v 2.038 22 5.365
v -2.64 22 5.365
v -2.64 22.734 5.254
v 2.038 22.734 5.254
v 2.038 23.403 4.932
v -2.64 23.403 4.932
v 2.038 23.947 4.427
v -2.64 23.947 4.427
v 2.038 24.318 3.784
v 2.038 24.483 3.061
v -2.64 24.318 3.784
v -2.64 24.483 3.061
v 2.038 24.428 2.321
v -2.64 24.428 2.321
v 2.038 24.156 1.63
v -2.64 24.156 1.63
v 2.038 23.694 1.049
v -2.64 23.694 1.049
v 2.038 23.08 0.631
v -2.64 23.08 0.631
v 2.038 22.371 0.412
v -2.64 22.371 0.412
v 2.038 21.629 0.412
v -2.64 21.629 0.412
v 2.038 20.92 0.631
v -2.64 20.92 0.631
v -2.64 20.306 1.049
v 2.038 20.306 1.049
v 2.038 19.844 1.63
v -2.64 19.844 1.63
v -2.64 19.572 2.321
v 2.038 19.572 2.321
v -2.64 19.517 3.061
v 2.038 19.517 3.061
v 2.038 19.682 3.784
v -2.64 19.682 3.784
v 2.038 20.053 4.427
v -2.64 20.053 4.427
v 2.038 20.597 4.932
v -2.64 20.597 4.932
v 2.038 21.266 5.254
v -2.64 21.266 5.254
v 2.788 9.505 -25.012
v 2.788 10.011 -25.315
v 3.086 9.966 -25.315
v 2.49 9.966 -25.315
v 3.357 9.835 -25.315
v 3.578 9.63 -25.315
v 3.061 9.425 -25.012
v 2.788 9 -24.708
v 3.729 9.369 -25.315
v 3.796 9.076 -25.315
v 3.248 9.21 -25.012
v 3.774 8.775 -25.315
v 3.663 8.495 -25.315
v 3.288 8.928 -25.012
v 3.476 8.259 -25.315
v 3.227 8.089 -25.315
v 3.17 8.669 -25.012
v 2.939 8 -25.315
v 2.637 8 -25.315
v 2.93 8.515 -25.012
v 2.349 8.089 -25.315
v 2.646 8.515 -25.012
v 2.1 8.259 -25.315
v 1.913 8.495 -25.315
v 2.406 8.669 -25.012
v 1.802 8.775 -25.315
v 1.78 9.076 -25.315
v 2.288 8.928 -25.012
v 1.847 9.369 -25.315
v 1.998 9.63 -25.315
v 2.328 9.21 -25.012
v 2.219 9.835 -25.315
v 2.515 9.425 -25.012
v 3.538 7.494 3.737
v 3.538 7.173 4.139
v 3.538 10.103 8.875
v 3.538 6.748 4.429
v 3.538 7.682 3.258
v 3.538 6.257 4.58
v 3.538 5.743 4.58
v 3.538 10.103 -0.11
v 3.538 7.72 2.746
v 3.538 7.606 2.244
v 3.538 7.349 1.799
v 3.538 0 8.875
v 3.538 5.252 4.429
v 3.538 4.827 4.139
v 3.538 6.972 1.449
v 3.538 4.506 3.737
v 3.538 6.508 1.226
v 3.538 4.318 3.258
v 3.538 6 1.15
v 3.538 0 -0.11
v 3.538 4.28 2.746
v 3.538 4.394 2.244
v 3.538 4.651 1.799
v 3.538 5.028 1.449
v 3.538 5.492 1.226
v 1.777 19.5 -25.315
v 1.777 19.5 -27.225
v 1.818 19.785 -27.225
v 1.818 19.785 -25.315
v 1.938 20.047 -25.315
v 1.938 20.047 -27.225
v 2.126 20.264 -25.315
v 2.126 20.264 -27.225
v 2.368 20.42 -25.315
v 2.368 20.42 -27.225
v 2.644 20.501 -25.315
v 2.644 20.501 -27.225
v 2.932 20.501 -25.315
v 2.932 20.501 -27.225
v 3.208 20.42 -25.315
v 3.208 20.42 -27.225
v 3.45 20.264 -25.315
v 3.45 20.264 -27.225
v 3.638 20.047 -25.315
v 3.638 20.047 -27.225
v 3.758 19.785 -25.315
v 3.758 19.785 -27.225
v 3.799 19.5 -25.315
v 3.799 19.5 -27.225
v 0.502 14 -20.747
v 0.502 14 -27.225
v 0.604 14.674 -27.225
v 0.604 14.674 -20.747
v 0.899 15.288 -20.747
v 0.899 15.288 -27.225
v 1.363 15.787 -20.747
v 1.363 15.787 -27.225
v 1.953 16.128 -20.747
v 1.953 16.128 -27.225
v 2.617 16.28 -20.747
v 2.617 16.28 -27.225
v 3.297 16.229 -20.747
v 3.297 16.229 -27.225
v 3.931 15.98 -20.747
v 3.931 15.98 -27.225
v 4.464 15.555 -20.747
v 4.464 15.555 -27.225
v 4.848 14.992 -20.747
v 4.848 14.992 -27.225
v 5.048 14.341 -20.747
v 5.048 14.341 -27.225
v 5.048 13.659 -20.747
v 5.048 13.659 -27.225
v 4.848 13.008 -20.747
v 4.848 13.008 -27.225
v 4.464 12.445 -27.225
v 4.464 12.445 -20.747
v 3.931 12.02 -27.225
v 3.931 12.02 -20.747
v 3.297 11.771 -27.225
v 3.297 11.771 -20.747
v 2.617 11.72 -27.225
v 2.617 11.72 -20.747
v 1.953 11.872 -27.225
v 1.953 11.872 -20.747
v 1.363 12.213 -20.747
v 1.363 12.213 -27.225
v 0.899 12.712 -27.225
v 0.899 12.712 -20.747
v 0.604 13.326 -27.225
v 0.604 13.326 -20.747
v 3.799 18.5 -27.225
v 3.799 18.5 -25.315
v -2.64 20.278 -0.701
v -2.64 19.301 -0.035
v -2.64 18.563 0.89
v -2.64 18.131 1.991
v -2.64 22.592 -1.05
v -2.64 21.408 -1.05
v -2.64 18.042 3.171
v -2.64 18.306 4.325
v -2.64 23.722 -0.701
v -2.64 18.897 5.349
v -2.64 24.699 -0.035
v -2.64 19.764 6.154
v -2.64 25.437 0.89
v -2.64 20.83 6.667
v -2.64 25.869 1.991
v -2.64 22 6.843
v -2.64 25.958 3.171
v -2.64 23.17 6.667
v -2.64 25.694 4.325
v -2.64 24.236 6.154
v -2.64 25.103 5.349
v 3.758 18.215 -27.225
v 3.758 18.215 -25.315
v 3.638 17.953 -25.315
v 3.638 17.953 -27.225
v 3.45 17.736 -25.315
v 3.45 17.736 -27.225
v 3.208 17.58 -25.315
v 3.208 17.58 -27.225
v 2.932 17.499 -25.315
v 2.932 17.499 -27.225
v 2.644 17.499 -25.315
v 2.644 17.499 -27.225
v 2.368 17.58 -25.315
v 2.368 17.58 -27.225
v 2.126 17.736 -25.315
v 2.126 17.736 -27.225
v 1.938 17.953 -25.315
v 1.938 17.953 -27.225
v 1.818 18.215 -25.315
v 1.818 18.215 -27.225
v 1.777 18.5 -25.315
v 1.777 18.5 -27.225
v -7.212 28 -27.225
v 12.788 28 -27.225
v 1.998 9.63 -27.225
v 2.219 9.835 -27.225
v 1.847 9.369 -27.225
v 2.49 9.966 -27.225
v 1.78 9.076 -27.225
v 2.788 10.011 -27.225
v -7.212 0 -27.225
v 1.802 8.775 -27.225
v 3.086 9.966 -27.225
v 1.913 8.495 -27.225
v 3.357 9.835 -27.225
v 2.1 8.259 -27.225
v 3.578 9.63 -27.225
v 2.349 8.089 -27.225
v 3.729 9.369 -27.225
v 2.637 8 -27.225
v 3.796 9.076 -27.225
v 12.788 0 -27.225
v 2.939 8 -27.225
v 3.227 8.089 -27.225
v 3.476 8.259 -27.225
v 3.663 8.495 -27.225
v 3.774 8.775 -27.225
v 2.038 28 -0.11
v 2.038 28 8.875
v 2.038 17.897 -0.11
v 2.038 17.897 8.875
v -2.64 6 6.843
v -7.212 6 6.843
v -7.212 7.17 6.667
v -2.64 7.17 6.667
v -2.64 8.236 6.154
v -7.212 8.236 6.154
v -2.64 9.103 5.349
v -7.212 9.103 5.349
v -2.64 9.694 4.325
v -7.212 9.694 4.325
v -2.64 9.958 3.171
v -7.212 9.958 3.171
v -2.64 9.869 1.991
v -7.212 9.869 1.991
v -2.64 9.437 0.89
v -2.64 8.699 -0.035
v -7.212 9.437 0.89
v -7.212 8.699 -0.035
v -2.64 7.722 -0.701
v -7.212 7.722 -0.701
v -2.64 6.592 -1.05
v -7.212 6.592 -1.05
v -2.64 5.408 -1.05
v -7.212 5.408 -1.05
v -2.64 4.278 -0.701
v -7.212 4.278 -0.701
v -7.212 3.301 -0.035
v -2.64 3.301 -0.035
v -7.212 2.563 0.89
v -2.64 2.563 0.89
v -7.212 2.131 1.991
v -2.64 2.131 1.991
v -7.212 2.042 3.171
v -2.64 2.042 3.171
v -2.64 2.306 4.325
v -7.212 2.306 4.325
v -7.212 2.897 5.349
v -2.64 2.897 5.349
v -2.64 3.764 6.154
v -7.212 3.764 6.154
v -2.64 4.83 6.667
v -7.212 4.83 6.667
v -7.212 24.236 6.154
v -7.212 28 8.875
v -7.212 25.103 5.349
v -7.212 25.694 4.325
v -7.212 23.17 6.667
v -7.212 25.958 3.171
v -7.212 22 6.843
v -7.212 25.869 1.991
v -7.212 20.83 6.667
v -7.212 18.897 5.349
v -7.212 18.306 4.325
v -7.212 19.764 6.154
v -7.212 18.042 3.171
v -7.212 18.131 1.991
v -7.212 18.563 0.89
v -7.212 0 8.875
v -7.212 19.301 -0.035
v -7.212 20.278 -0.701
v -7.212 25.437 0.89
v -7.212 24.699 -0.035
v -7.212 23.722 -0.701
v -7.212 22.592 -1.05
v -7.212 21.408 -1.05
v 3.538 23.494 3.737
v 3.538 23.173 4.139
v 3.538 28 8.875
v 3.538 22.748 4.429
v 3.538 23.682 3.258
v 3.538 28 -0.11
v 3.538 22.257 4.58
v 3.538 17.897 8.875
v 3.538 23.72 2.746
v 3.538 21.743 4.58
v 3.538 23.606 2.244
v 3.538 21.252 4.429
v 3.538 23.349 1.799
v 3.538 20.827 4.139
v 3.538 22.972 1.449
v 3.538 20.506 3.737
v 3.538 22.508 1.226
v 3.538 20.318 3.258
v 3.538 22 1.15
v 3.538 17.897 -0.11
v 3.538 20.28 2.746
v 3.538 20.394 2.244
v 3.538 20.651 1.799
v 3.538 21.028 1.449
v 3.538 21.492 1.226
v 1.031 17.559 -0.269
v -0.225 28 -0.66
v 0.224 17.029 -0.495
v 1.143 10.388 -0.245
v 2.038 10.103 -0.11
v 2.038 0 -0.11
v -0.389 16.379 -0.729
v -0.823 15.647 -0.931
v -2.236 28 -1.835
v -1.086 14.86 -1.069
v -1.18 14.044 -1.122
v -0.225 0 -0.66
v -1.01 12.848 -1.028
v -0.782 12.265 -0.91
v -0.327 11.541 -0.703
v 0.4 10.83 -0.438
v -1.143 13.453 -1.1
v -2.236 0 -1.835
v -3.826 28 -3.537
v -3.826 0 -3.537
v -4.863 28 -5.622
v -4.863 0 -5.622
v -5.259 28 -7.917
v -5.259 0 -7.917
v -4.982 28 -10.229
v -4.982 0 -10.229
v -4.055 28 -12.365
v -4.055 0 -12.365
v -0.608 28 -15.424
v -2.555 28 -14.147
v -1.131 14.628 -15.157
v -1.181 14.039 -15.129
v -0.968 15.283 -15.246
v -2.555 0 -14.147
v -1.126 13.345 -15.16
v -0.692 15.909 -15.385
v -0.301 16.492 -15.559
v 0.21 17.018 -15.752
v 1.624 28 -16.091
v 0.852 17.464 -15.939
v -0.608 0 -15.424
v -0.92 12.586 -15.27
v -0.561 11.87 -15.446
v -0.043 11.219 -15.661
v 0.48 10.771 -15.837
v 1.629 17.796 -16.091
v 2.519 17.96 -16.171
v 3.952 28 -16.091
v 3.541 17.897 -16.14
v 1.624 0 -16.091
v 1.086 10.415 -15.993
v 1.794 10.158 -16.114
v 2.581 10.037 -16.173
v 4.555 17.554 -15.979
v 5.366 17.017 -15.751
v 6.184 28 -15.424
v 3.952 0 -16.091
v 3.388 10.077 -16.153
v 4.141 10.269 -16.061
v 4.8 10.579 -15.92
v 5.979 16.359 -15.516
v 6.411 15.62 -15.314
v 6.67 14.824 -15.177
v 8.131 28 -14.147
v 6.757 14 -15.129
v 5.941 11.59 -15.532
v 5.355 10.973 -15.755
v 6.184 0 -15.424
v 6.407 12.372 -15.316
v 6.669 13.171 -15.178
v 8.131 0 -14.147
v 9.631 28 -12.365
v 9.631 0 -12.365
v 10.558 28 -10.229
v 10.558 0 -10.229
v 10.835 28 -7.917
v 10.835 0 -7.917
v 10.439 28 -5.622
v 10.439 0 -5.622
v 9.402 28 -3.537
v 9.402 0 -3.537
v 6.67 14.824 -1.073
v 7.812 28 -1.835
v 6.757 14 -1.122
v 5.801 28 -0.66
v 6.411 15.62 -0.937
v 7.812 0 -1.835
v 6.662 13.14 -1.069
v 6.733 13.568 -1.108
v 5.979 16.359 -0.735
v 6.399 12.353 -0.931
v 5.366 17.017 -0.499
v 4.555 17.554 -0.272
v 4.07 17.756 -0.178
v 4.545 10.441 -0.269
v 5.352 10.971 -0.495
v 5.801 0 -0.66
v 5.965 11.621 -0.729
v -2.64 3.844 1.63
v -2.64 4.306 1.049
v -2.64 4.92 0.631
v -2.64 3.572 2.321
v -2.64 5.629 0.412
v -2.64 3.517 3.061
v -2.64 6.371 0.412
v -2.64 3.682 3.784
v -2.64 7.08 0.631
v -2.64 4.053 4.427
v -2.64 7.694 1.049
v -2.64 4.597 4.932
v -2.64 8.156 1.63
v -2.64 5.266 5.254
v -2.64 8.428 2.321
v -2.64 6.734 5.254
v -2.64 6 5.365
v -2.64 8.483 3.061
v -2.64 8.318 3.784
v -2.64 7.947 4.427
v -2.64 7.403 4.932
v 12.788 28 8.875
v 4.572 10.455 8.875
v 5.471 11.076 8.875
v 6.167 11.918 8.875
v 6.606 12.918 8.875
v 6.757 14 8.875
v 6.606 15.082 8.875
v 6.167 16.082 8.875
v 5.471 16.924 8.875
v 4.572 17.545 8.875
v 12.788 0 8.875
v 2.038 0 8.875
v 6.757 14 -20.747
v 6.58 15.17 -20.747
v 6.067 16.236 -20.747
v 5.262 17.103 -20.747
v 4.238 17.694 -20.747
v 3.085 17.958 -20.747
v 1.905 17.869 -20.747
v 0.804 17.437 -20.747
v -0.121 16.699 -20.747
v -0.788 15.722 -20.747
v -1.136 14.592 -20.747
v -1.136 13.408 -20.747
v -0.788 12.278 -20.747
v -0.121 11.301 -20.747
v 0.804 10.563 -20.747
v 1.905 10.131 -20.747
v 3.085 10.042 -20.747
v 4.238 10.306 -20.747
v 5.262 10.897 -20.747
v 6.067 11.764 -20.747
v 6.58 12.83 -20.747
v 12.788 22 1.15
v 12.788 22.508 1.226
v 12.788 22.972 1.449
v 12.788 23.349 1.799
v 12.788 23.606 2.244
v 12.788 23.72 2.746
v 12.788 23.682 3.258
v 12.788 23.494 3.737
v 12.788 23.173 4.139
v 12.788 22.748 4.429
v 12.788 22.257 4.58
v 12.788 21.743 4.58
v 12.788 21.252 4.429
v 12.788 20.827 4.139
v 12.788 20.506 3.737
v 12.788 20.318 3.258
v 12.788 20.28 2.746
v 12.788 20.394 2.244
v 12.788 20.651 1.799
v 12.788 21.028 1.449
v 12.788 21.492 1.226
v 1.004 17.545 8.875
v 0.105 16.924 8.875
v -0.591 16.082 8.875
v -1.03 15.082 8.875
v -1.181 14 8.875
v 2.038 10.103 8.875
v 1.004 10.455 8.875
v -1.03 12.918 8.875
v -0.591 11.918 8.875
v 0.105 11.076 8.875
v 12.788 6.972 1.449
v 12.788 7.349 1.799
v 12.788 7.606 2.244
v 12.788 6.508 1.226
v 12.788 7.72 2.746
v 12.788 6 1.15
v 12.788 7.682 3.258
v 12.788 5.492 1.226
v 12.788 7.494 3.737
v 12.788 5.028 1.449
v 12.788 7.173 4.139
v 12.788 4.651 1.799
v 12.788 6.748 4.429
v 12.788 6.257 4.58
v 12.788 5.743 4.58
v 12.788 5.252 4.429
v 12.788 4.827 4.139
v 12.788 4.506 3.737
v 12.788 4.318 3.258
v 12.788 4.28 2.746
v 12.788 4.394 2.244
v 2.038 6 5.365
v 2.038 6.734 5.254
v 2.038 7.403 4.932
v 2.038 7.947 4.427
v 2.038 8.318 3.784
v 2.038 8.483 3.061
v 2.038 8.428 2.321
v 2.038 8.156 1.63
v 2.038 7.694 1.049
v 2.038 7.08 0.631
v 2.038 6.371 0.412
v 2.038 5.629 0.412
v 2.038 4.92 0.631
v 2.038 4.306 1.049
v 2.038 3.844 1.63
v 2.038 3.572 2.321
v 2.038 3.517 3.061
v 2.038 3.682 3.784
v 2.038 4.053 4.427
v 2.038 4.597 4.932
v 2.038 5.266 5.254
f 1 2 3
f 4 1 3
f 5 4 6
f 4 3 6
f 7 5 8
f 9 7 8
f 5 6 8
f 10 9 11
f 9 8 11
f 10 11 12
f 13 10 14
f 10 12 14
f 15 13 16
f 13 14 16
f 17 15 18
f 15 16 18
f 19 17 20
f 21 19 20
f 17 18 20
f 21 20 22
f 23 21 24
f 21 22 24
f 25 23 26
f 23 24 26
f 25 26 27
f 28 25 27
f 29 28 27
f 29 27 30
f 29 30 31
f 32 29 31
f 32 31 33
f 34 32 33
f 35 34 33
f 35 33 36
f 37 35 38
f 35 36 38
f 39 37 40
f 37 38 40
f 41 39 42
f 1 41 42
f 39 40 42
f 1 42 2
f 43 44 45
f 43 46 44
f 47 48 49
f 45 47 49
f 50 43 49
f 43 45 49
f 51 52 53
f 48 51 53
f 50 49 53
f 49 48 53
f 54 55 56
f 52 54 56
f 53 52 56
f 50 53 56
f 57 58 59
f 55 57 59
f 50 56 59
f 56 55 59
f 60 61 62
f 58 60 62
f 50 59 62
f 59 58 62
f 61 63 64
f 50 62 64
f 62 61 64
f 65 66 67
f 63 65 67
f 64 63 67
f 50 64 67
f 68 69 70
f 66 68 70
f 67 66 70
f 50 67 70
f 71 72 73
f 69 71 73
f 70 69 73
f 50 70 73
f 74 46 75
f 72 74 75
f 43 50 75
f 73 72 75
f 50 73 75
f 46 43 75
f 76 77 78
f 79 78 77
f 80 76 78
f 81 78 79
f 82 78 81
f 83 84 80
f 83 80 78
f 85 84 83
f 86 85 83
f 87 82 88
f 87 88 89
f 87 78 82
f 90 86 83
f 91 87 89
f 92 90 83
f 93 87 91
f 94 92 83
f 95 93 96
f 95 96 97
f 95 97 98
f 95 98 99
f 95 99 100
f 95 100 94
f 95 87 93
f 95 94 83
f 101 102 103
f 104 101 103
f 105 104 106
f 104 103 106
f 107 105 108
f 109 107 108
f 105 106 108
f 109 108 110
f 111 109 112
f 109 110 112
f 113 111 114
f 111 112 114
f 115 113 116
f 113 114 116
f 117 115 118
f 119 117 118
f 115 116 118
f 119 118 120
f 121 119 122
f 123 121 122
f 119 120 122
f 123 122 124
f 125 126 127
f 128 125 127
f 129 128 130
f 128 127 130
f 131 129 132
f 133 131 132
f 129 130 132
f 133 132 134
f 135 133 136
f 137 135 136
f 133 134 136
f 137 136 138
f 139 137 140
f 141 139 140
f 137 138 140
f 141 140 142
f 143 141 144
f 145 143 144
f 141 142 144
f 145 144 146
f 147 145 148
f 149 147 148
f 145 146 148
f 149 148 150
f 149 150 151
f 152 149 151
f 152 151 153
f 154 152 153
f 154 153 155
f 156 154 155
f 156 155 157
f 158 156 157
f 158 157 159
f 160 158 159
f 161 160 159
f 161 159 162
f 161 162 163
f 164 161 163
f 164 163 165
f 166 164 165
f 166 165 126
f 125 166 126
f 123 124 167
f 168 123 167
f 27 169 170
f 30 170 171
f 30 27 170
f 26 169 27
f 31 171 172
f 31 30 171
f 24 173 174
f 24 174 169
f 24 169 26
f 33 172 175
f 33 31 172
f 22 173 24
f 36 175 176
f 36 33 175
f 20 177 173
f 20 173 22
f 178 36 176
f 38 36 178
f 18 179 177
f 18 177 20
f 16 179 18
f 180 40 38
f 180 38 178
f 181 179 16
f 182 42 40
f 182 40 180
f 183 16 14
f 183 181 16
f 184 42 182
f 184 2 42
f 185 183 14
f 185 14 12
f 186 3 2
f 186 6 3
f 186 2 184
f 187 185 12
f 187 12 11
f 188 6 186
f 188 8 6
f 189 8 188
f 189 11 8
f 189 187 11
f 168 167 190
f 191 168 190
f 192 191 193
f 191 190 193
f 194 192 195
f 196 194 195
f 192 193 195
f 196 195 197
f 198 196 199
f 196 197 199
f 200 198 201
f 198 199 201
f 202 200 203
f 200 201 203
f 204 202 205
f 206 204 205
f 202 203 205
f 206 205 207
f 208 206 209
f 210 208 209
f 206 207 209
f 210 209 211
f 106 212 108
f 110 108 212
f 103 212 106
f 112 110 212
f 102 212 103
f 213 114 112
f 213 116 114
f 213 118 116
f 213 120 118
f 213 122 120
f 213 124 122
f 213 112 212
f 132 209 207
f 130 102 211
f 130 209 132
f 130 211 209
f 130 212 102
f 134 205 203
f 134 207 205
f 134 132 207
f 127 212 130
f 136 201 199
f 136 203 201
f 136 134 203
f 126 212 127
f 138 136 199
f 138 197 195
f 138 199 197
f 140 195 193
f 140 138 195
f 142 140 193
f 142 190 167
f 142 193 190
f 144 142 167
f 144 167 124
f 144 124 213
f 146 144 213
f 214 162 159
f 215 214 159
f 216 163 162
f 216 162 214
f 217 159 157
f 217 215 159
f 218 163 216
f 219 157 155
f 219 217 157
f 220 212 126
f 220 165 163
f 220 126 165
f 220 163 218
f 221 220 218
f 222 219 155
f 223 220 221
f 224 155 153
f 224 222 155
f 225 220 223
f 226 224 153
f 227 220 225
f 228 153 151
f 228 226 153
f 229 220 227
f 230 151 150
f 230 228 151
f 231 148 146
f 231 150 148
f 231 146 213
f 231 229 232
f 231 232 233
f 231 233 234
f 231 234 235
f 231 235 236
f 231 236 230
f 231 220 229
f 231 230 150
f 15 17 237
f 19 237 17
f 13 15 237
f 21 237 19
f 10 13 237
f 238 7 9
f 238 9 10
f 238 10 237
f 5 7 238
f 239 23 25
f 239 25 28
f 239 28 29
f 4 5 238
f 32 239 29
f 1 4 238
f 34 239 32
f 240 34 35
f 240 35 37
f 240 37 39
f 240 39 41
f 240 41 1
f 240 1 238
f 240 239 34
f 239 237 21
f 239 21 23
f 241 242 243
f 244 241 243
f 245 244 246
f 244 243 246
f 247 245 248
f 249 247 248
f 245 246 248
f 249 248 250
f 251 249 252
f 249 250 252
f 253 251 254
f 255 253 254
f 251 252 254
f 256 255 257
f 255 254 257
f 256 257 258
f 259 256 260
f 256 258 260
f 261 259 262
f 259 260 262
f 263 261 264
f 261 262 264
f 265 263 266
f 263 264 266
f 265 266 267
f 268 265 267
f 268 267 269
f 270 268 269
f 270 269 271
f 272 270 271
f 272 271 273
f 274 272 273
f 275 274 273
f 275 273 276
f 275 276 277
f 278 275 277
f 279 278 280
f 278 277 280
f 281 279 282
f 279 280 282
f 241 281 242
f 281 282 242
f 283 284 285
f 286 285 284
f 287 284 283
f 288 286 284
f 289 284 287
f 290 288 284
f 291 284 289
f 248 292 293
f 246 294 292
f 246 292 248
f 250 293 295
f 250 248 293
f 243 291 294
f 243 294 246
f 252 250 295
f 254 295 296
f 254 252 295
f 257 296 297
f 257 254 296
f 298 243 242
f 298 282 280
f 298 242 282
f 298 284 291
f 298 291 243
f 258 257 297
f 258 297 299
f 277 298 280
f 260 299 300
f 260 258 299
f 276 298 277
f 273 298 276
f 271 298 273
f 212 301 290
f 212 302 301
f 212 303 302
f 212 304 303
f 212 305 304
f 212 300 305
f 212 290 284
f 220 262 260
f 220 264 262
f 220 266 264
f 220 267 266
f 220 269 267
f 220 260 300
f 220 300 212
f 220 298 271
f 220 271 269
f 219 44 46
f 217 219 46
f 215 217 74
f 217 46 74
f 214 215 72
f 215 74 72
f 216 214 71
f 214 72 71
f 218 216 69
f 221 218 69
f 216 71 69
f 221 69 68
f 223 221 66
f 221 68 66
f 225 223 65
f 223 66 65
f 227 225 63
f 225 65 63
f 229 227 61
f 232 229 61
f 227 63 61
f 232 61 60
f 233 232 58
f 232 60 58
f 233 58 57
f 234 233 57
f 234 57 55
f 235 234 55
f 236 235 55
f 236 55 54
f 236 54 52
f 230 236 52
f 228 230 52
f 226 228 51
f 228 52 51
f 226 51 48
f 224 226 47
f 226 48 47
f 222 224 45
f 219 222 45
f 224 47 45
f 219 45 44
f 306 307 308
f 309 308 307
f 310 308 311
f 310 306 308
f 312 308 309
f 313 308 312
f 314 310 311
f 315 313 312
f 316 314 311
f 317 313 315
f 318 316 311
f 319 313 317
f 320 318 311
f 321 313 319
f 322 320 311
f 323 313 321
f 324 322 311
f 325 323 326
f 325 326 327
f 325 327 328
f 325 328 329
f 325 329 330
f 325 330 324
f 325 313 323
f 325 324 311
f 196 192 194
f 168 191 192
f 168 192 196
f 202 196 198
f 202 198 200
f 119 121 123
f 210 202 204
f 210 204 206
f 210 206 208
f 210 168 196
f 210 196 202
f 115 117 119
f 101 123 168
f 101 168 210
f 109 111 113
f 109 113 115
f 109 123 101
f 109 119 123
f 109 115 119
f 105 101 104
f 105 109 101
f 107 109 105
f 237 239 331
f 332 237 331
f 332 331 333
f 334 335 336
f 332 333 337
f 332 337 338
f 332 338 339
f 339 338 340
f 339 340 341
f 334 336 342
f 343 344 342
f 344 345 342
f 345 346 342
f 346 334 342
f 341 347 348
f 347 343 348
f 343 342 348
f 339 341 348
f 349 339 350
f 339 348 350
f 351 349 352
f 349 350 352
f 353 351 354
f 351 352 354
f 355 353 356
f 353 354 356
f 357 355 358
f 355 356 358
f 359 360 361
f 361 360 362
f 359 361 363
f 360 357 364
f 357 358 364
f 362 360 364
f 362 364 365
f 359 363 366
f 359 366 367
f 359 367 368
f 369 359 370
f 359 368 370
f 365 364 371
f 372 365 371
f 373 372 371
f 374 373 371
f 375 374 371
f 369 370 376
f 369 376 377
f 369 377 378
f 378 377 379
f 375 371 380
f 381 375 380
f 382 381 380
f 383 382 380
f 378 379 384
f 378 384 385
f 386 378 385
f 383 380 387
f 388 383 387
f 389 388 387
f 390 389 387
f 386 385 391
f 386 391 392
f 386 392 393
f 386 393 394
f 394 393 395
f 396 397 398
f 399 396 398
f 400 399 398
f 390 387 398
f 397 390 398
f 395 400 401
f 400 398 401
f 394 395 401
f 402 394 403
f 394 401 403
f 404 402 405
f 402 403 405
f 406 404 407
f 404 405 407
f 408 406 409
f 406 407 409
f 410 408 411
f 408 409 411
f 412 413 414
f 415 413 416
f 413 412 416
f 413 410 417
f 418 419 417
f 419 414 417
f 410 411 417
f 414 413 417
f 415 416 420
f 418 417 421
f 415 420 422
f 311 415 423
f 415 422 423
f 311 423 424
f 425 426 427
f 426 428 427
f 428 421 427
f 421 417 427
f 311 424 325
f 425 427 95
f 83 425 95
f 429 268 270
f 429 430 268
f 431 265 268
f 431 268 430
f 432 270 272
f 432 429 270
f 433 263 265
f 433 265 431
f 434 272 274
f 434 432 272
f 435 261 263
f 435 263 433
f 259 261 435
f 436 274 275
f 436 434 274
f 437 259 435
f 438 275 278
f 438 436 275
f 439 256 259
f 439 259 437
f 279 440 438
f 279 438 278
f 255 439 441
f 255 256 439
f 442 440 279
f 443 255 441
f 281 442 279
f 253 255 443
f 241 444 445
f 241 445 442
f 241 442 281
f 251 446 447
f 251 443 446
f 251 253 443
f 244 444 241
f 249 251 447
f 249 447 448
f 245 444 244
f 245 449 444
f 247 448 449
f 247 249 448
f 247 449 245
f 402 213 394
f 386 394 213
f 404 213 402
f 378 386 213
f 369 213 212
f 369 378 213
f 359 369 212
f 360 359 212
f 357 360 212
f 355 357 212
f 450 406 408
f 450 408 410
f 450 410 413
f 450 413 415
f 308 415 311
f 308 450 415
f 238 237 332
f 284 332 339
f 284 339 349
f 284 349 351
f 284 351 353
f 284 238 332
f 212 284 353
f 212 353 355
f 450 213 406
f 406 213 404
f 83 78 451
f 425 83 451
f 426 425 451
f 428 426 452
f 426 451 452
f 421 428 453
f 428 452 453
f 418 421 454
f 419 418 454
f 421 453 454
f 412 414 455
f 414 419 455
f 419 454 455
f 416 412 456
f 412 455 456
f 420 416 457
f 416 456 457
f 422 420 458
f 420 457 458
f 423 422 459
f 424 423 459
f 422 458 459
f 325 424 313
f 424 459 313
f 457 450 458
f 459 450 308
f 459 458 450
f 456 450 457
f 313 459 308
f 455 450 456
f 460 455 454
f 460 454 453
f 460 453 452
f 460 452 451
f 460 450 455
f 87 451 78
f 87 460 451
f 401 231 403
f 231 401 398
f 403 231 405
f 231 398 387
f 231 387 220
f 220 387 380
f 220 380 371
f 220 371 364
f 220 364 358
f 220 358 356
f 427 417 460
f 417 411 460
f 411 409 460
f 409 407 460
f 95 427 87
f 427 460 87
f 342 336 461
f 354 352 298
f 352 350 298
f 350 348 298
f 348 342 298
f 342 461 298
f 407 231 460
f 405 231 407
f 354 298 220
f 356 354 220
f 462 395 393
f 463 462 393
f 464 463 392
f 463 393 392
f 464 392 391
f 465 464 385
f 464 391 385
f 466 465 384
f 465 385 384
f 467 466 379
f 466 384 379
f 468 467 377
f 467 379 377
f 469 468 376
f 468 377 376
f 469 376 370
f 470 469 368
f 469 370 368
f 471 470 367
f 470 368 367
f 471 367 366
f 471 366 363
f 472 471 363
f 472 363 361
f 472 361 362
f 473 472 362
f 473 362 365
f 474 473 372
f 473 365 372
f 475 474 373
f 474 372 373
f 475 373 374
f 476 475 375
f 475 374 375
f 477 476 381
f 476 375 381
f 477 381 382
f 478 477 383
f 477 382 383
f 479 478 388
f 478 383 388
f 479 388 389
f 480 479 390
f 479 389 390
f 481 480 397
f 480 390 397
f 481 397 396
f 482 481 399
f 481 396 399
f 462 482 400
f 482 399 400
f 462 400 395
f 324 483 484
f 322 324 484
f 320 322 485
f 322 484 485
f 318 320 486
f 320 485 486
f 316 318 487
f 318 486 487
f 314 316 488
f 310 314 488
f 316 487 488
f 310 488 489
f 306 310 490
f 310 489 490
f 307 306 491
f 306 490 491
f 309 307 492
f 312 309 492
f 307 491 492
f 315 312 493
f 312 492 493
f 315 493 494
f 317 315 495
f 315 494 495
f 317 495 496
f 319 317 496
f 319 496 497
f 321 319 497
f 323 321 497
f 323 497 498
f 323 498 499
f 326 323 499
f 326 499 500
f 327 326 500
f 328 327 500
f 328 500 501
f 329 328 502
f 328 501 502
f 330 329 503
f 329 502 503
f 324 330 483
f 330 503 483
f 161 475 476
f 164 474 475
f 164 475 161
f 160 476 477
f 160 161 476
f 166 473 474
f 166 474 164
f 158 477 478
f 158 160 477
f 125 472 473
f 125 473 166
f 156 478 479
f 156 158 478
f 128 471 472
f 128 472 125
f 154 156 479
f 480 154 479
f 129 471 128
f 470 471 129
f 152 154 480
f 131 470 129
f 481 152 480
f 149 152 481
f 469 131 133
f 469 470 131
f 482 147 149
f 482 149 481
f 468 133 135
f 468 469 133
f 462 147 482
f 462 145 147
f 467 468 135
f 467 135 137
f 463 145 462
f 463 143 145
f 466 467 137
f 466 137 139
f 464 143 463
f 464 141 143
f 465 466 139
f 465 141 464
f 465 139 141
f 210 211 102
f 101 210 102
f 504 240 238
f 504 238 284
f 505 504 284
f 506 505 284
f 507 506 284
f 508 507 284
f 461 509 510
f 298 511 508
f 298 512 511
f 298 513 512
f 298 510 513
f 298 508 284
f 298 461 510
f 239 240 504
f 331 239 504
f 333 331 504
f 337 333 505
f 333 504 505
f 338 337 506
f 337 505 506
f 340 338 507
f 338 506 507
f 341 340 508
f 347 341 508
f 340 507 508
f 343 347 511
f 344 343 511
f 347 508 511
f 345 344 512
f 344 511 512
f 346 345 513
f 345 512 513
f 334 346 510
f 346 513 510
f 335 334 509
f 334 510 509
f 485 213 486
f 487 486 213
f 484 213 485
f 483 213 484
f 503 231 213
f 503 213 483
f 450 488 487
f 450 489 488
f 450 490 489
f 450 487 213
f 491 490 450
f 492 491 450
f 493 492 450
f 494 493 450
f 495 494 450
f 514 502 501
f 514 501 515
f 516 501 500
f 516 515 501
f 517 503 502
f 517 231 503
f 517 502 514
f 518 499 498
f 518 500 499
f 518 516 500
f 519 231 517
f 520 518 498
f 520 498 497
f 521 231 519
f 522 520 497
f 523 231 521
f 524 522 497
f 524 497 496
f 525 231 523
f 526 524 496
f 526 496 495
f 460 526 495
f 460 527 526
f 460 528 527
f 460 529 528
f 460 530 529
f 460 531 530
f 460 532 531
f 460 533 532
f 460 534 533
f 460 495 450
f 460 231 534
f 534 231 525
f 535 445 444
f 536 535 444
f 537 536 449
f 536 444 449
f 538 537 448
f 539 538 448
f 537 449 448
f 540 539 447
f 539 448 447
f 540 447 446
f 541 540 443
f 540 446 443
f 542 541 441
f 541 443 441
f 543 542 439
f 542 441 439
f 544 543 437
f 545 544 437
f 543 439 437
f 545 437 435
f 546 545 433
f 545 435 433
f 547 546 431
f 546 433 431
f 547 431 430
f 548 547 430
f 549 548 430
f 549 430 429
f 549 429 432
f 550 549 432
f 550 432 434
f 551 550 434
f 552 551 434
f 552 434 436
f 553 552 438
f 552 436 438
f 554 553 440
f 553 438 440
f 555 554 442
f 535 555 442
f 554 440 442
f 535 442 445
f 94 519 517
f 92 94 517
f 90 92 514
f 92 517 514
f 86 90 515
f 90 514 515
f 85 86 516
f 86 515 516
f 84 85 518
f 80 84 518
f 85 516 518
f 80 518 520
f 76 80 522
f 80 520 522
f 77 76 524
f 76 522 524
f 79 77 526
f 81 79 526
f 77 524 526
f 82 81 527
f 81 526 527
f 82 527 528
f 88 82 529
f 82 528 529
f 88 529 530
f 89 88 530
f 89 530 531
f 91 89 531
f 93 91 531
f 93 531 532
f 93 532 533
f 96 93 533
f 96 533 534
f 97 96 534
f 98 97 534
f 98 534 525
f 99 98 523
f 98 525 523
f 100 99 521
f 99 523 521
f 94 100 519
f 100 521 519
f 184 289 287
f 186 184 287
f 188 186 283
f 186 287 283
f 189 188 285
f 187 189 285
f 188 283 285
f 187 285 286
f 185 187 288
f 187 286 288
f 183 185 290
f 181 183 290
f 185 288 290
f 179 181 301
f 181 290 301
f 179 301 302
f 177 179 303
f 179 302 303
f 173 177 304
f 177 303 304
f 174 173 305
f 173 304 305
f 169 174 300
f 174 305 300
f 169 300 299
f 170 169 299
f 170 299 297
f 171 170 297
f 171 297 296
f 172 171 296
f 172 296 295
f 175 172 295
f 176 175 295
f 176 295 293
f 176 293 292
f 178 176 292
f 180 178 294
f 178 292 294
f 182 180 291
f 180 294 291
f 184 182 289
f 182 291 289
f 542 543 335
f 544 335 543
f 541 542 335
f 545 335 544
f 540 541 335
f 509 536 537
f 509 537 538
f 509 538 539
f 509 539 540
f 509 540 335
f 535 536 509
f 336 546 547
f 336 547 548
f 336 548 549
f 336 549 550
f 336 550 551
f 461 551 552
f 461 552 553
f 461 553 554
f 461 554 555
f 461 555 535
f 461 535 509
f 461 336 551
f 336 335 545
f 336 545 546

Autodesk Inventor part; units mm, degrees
ref_plane "YZ Plane" through (0, 0, 0) normal (1, 0, 0) x (0, 1, 0)
ref_plane "XZ Plane" through (0, 0, 0) normal (0, 1, 0) x (-1, 0, 0)
ref_plane "XY Plane" through (0, 0, 0) normal (0, 0, 1) x (1, 0, 0)
sketch "Sketch1" plane through (0, 0, 0) normal (0, 1, 0) x (-1, 0, 0)
  line L0 (-12.788, 8.8746) -> (7.212, 8.8746)
  line L1 (7.212, 8.8746) -> (7.212, -27.2254)
  line L2 (7.212, -27.2254) -> (-12.788, -27.2254)
  line L3 (-12.788, -27.2254) -> (-12.788, 8.8746)
  point P0 (0, 0)
  dimension "d0" = 20
  dimension "d1" = 36.1
extrude "Extrusion1" add sketch "Sketch1" along normal blind 28
sketch "Sketch2" plane through (0, 0, 0) normal (0, -1, 0) x (1, 0, 0)
  line L0 (-7.212, -27.2254) -> (12.788, -27.2254) projected
  line L1 (12.788, -27.2254) -> (12.788, 8.8746) projected
  circle A0 centre (2.788, -8.1254) radius 8.05
  point P0 (0, 0)
  dimension "d4" = 10
  dimension "d5" = 16.1
  dimension "d6" = 19.1
extrude "Extrusion2" cut sketch "Sketch2" against normal blind 30
sketch "Sketch3" plane through (0, 0, 0) normal (0, -1, 0) x (1, 0, 0)
  circle A0 centre (2.788, -8.1254) radius 8.05 projected
  line L0 (12.788, 8.8746) -> (-7.212, 8.8746) projected
  line L1 (2.038, 8.8746) -> (3.538, 8.8746)
  line L2 (3.538, 8.8746) -> (3.538, -9.1254)
  line L3 (3.538, -9.1254) -> (2.038, -9.1254)
  line L4 (2.038, -9.1254) -> (2.038, 8.8746)
  point P0 (0, 0)
  dimension "d9" = 18
  dimension "d11" = 1.5
  dimension "d12" = 0.75
extrude "Extrusion3" cut sketch "Sketch3" against normal blind 30 contours L2 L3 L4 A0 | A0 L4 L0 L2 picked at (2.8714, -6.11)
sketch "Sketch4" plane through (12.788, 0, -27.2254) normal (0, 0, -1) x (-1, 0, 0)
  line L0 (0, 28) -> (20, 28) projected
  line L1 (0, 0) -> (0, 28) projected
  circle A0 centre (10, 14) radius 2.286
  point P0 (12.788, 0)
  dimension "d15" = 14
  dimension "d16" = 10
  dimension "d17" = 4.572
extrude "Extrusion4" cut sketch "Sketch4" against normal blind 10
sketch "Sketch6" plane through (-7.212, 0, -27.2254) normal (-1, 0, 0) x (0, 0, 1)
  line L0 (36.1, 0) -> (0, 0) projected
  line L1 (36.1, 0) -> (36.1, 28) projected
  line L2 (0, 28) -> (36.1, 28) projected
  circle A0 centre (30.1, 6) radius 2.49
  circle A1 centre (30.1, 22) radius 2.49
  point P0 (27.2254, 0)
  dimension "d20" = 6
  dimension "d21" = 6
  dimension "d22" = 4.98
  dimension "d23" = 4.98
  dimension "d24" = 6
  dimension "d25" = 6
extrude "Extrusion5" cut sketch "Sketch6" against normal blind 10
sketch "Sketch7" plane through (12.788, 0, 8.8746) normal (1, 0, 0) x (0, 0, -1)
  circle A0 centre (6, 6) radius 1.725
  circle A1 centre (6, 22) radius 1.725
  line L0 (36.1, 0) -> (0, 0) projected
  line L1 (0, 28) -> (36.1, 28) projected
  line L2 (0, 0) -> (0, 28) projected
  point P0 (8.8746, 0)
  dimension "d28" = 3.45
  dimension "d29" = 3.45
  dimension "d88" = 6
  dimension "d89" = 6
  dimension "d91" = 6
  dimension "d92" = 6
extrude "Extrusion8" cut sketch "Sketch7" against normal blind 10
thread "Thread8" size "8-32 UNC" class "2B" standard "ANSI Unified Screw Threads" full length
thread "Thread11" size "8-32 UNC" class "2B" standard "ANSI Unified Screw Threads" full length
sketch "Sketch11" plane through (12.788, 0, -27.2254) normal (0, 0, -1) x (-1, 0, 0)
  circle A0 centre (10, 14) radius 2.286 projected
  circle A1 centre (10, 14) radius 0.7841
  circle A2 centre (10, 9) radius 1.0109
  line L0 (10, 18) -> (10, 17) construction
  line L1 (11.0033, 17) -> (11.0033, 18)
  point P0 (12.788, 0)
  point P1 (10, 17.5)
  dimension "d69" = 5
  dimension "d71" = 2.0218
hole "Hole1" at (2.788, 9, -27.2254) direction (0, 0, 1) diameter 2.0218 depth 1.91 tip angle 118
sketch "Sketch13" plane through (12.788, 0, -27.2254) normal (0, 0, -1) x (-1, 0, 0)
  circle A0 centre (10, 9) radius 1.0109 projected
  line L0 (10, 18.5) -> (10, 19.5) construction
  line L1 (11.0109, 18.5) -> (11.0109, 19.5)
  line L2 (8.9891, 19.5) -> (8.9891, 18.5)
  arc A1 (8.9891, 18.5) -> (11.0109, 18.5) centre (10, 18.5) ccw
  arc A2 (11.0109, 19.5) -> (8.9891, 19.5) centre (10, 19.5) ccw
  point P0 (12.788, 0)
  point P1 (10, 19)
  dimension "d81" = 0.5
  dimension "d82" = 2.0218
  dimension "d97" = 10
extrude "Extrusion12" cut sketch "Sketch13" against normal blind 1.91 contours A1 L2 A2 L1
sketch "Sketch15" plane through (-7.212, 0, -27.2254) normal (-1, 0, 0) x (0, 0, 1)
  circle A0 centre (30.1, 22) radius 1.725 projected
  circle A1 centre (30.1, 22) radius 3.9688
  circle A2 centre (30.1, 6) radius 1.725 projected
  circle A3 centre (30.1, 6) radius 3.9687
  point P0 (27.2254, 0)
  point P1 (27.015, 20.5839)
  point P2 (27.015, 23.4161)
  point P3 (27.015, 4.5839)
  point P4 (27.015, 7.4161)
  dimension "d93" = 7.9375
  dimension "d94" = 7.9375
extrude "Extrusion13" cut sketch "Sketch15" against normal blind 4.572 contours A0 | A1 | A2 | A3
sketch "Sketch16" plane through (-7.212, 0, 8.8746) normal (0, 0, 1) x (1, 0, 0)
  circle A0 centre (10, 14) radius 2.286 projected
  circle A1 centre (10, 14) radius 3.9687
  point P0 (7.212, 0)
  dimension "d98" = 7.9375
extrude "Extrusion14" cut sketch "Sketch16" against normal blind 29.622 contours A0 | A1
ref_plane "Work Plane1" through (2.788, 28, 8.8746) normal (1, 0, 0) x (0, 0, -1)
properties part number "Galvo-Holder-PolarisMount_metal_v2"
